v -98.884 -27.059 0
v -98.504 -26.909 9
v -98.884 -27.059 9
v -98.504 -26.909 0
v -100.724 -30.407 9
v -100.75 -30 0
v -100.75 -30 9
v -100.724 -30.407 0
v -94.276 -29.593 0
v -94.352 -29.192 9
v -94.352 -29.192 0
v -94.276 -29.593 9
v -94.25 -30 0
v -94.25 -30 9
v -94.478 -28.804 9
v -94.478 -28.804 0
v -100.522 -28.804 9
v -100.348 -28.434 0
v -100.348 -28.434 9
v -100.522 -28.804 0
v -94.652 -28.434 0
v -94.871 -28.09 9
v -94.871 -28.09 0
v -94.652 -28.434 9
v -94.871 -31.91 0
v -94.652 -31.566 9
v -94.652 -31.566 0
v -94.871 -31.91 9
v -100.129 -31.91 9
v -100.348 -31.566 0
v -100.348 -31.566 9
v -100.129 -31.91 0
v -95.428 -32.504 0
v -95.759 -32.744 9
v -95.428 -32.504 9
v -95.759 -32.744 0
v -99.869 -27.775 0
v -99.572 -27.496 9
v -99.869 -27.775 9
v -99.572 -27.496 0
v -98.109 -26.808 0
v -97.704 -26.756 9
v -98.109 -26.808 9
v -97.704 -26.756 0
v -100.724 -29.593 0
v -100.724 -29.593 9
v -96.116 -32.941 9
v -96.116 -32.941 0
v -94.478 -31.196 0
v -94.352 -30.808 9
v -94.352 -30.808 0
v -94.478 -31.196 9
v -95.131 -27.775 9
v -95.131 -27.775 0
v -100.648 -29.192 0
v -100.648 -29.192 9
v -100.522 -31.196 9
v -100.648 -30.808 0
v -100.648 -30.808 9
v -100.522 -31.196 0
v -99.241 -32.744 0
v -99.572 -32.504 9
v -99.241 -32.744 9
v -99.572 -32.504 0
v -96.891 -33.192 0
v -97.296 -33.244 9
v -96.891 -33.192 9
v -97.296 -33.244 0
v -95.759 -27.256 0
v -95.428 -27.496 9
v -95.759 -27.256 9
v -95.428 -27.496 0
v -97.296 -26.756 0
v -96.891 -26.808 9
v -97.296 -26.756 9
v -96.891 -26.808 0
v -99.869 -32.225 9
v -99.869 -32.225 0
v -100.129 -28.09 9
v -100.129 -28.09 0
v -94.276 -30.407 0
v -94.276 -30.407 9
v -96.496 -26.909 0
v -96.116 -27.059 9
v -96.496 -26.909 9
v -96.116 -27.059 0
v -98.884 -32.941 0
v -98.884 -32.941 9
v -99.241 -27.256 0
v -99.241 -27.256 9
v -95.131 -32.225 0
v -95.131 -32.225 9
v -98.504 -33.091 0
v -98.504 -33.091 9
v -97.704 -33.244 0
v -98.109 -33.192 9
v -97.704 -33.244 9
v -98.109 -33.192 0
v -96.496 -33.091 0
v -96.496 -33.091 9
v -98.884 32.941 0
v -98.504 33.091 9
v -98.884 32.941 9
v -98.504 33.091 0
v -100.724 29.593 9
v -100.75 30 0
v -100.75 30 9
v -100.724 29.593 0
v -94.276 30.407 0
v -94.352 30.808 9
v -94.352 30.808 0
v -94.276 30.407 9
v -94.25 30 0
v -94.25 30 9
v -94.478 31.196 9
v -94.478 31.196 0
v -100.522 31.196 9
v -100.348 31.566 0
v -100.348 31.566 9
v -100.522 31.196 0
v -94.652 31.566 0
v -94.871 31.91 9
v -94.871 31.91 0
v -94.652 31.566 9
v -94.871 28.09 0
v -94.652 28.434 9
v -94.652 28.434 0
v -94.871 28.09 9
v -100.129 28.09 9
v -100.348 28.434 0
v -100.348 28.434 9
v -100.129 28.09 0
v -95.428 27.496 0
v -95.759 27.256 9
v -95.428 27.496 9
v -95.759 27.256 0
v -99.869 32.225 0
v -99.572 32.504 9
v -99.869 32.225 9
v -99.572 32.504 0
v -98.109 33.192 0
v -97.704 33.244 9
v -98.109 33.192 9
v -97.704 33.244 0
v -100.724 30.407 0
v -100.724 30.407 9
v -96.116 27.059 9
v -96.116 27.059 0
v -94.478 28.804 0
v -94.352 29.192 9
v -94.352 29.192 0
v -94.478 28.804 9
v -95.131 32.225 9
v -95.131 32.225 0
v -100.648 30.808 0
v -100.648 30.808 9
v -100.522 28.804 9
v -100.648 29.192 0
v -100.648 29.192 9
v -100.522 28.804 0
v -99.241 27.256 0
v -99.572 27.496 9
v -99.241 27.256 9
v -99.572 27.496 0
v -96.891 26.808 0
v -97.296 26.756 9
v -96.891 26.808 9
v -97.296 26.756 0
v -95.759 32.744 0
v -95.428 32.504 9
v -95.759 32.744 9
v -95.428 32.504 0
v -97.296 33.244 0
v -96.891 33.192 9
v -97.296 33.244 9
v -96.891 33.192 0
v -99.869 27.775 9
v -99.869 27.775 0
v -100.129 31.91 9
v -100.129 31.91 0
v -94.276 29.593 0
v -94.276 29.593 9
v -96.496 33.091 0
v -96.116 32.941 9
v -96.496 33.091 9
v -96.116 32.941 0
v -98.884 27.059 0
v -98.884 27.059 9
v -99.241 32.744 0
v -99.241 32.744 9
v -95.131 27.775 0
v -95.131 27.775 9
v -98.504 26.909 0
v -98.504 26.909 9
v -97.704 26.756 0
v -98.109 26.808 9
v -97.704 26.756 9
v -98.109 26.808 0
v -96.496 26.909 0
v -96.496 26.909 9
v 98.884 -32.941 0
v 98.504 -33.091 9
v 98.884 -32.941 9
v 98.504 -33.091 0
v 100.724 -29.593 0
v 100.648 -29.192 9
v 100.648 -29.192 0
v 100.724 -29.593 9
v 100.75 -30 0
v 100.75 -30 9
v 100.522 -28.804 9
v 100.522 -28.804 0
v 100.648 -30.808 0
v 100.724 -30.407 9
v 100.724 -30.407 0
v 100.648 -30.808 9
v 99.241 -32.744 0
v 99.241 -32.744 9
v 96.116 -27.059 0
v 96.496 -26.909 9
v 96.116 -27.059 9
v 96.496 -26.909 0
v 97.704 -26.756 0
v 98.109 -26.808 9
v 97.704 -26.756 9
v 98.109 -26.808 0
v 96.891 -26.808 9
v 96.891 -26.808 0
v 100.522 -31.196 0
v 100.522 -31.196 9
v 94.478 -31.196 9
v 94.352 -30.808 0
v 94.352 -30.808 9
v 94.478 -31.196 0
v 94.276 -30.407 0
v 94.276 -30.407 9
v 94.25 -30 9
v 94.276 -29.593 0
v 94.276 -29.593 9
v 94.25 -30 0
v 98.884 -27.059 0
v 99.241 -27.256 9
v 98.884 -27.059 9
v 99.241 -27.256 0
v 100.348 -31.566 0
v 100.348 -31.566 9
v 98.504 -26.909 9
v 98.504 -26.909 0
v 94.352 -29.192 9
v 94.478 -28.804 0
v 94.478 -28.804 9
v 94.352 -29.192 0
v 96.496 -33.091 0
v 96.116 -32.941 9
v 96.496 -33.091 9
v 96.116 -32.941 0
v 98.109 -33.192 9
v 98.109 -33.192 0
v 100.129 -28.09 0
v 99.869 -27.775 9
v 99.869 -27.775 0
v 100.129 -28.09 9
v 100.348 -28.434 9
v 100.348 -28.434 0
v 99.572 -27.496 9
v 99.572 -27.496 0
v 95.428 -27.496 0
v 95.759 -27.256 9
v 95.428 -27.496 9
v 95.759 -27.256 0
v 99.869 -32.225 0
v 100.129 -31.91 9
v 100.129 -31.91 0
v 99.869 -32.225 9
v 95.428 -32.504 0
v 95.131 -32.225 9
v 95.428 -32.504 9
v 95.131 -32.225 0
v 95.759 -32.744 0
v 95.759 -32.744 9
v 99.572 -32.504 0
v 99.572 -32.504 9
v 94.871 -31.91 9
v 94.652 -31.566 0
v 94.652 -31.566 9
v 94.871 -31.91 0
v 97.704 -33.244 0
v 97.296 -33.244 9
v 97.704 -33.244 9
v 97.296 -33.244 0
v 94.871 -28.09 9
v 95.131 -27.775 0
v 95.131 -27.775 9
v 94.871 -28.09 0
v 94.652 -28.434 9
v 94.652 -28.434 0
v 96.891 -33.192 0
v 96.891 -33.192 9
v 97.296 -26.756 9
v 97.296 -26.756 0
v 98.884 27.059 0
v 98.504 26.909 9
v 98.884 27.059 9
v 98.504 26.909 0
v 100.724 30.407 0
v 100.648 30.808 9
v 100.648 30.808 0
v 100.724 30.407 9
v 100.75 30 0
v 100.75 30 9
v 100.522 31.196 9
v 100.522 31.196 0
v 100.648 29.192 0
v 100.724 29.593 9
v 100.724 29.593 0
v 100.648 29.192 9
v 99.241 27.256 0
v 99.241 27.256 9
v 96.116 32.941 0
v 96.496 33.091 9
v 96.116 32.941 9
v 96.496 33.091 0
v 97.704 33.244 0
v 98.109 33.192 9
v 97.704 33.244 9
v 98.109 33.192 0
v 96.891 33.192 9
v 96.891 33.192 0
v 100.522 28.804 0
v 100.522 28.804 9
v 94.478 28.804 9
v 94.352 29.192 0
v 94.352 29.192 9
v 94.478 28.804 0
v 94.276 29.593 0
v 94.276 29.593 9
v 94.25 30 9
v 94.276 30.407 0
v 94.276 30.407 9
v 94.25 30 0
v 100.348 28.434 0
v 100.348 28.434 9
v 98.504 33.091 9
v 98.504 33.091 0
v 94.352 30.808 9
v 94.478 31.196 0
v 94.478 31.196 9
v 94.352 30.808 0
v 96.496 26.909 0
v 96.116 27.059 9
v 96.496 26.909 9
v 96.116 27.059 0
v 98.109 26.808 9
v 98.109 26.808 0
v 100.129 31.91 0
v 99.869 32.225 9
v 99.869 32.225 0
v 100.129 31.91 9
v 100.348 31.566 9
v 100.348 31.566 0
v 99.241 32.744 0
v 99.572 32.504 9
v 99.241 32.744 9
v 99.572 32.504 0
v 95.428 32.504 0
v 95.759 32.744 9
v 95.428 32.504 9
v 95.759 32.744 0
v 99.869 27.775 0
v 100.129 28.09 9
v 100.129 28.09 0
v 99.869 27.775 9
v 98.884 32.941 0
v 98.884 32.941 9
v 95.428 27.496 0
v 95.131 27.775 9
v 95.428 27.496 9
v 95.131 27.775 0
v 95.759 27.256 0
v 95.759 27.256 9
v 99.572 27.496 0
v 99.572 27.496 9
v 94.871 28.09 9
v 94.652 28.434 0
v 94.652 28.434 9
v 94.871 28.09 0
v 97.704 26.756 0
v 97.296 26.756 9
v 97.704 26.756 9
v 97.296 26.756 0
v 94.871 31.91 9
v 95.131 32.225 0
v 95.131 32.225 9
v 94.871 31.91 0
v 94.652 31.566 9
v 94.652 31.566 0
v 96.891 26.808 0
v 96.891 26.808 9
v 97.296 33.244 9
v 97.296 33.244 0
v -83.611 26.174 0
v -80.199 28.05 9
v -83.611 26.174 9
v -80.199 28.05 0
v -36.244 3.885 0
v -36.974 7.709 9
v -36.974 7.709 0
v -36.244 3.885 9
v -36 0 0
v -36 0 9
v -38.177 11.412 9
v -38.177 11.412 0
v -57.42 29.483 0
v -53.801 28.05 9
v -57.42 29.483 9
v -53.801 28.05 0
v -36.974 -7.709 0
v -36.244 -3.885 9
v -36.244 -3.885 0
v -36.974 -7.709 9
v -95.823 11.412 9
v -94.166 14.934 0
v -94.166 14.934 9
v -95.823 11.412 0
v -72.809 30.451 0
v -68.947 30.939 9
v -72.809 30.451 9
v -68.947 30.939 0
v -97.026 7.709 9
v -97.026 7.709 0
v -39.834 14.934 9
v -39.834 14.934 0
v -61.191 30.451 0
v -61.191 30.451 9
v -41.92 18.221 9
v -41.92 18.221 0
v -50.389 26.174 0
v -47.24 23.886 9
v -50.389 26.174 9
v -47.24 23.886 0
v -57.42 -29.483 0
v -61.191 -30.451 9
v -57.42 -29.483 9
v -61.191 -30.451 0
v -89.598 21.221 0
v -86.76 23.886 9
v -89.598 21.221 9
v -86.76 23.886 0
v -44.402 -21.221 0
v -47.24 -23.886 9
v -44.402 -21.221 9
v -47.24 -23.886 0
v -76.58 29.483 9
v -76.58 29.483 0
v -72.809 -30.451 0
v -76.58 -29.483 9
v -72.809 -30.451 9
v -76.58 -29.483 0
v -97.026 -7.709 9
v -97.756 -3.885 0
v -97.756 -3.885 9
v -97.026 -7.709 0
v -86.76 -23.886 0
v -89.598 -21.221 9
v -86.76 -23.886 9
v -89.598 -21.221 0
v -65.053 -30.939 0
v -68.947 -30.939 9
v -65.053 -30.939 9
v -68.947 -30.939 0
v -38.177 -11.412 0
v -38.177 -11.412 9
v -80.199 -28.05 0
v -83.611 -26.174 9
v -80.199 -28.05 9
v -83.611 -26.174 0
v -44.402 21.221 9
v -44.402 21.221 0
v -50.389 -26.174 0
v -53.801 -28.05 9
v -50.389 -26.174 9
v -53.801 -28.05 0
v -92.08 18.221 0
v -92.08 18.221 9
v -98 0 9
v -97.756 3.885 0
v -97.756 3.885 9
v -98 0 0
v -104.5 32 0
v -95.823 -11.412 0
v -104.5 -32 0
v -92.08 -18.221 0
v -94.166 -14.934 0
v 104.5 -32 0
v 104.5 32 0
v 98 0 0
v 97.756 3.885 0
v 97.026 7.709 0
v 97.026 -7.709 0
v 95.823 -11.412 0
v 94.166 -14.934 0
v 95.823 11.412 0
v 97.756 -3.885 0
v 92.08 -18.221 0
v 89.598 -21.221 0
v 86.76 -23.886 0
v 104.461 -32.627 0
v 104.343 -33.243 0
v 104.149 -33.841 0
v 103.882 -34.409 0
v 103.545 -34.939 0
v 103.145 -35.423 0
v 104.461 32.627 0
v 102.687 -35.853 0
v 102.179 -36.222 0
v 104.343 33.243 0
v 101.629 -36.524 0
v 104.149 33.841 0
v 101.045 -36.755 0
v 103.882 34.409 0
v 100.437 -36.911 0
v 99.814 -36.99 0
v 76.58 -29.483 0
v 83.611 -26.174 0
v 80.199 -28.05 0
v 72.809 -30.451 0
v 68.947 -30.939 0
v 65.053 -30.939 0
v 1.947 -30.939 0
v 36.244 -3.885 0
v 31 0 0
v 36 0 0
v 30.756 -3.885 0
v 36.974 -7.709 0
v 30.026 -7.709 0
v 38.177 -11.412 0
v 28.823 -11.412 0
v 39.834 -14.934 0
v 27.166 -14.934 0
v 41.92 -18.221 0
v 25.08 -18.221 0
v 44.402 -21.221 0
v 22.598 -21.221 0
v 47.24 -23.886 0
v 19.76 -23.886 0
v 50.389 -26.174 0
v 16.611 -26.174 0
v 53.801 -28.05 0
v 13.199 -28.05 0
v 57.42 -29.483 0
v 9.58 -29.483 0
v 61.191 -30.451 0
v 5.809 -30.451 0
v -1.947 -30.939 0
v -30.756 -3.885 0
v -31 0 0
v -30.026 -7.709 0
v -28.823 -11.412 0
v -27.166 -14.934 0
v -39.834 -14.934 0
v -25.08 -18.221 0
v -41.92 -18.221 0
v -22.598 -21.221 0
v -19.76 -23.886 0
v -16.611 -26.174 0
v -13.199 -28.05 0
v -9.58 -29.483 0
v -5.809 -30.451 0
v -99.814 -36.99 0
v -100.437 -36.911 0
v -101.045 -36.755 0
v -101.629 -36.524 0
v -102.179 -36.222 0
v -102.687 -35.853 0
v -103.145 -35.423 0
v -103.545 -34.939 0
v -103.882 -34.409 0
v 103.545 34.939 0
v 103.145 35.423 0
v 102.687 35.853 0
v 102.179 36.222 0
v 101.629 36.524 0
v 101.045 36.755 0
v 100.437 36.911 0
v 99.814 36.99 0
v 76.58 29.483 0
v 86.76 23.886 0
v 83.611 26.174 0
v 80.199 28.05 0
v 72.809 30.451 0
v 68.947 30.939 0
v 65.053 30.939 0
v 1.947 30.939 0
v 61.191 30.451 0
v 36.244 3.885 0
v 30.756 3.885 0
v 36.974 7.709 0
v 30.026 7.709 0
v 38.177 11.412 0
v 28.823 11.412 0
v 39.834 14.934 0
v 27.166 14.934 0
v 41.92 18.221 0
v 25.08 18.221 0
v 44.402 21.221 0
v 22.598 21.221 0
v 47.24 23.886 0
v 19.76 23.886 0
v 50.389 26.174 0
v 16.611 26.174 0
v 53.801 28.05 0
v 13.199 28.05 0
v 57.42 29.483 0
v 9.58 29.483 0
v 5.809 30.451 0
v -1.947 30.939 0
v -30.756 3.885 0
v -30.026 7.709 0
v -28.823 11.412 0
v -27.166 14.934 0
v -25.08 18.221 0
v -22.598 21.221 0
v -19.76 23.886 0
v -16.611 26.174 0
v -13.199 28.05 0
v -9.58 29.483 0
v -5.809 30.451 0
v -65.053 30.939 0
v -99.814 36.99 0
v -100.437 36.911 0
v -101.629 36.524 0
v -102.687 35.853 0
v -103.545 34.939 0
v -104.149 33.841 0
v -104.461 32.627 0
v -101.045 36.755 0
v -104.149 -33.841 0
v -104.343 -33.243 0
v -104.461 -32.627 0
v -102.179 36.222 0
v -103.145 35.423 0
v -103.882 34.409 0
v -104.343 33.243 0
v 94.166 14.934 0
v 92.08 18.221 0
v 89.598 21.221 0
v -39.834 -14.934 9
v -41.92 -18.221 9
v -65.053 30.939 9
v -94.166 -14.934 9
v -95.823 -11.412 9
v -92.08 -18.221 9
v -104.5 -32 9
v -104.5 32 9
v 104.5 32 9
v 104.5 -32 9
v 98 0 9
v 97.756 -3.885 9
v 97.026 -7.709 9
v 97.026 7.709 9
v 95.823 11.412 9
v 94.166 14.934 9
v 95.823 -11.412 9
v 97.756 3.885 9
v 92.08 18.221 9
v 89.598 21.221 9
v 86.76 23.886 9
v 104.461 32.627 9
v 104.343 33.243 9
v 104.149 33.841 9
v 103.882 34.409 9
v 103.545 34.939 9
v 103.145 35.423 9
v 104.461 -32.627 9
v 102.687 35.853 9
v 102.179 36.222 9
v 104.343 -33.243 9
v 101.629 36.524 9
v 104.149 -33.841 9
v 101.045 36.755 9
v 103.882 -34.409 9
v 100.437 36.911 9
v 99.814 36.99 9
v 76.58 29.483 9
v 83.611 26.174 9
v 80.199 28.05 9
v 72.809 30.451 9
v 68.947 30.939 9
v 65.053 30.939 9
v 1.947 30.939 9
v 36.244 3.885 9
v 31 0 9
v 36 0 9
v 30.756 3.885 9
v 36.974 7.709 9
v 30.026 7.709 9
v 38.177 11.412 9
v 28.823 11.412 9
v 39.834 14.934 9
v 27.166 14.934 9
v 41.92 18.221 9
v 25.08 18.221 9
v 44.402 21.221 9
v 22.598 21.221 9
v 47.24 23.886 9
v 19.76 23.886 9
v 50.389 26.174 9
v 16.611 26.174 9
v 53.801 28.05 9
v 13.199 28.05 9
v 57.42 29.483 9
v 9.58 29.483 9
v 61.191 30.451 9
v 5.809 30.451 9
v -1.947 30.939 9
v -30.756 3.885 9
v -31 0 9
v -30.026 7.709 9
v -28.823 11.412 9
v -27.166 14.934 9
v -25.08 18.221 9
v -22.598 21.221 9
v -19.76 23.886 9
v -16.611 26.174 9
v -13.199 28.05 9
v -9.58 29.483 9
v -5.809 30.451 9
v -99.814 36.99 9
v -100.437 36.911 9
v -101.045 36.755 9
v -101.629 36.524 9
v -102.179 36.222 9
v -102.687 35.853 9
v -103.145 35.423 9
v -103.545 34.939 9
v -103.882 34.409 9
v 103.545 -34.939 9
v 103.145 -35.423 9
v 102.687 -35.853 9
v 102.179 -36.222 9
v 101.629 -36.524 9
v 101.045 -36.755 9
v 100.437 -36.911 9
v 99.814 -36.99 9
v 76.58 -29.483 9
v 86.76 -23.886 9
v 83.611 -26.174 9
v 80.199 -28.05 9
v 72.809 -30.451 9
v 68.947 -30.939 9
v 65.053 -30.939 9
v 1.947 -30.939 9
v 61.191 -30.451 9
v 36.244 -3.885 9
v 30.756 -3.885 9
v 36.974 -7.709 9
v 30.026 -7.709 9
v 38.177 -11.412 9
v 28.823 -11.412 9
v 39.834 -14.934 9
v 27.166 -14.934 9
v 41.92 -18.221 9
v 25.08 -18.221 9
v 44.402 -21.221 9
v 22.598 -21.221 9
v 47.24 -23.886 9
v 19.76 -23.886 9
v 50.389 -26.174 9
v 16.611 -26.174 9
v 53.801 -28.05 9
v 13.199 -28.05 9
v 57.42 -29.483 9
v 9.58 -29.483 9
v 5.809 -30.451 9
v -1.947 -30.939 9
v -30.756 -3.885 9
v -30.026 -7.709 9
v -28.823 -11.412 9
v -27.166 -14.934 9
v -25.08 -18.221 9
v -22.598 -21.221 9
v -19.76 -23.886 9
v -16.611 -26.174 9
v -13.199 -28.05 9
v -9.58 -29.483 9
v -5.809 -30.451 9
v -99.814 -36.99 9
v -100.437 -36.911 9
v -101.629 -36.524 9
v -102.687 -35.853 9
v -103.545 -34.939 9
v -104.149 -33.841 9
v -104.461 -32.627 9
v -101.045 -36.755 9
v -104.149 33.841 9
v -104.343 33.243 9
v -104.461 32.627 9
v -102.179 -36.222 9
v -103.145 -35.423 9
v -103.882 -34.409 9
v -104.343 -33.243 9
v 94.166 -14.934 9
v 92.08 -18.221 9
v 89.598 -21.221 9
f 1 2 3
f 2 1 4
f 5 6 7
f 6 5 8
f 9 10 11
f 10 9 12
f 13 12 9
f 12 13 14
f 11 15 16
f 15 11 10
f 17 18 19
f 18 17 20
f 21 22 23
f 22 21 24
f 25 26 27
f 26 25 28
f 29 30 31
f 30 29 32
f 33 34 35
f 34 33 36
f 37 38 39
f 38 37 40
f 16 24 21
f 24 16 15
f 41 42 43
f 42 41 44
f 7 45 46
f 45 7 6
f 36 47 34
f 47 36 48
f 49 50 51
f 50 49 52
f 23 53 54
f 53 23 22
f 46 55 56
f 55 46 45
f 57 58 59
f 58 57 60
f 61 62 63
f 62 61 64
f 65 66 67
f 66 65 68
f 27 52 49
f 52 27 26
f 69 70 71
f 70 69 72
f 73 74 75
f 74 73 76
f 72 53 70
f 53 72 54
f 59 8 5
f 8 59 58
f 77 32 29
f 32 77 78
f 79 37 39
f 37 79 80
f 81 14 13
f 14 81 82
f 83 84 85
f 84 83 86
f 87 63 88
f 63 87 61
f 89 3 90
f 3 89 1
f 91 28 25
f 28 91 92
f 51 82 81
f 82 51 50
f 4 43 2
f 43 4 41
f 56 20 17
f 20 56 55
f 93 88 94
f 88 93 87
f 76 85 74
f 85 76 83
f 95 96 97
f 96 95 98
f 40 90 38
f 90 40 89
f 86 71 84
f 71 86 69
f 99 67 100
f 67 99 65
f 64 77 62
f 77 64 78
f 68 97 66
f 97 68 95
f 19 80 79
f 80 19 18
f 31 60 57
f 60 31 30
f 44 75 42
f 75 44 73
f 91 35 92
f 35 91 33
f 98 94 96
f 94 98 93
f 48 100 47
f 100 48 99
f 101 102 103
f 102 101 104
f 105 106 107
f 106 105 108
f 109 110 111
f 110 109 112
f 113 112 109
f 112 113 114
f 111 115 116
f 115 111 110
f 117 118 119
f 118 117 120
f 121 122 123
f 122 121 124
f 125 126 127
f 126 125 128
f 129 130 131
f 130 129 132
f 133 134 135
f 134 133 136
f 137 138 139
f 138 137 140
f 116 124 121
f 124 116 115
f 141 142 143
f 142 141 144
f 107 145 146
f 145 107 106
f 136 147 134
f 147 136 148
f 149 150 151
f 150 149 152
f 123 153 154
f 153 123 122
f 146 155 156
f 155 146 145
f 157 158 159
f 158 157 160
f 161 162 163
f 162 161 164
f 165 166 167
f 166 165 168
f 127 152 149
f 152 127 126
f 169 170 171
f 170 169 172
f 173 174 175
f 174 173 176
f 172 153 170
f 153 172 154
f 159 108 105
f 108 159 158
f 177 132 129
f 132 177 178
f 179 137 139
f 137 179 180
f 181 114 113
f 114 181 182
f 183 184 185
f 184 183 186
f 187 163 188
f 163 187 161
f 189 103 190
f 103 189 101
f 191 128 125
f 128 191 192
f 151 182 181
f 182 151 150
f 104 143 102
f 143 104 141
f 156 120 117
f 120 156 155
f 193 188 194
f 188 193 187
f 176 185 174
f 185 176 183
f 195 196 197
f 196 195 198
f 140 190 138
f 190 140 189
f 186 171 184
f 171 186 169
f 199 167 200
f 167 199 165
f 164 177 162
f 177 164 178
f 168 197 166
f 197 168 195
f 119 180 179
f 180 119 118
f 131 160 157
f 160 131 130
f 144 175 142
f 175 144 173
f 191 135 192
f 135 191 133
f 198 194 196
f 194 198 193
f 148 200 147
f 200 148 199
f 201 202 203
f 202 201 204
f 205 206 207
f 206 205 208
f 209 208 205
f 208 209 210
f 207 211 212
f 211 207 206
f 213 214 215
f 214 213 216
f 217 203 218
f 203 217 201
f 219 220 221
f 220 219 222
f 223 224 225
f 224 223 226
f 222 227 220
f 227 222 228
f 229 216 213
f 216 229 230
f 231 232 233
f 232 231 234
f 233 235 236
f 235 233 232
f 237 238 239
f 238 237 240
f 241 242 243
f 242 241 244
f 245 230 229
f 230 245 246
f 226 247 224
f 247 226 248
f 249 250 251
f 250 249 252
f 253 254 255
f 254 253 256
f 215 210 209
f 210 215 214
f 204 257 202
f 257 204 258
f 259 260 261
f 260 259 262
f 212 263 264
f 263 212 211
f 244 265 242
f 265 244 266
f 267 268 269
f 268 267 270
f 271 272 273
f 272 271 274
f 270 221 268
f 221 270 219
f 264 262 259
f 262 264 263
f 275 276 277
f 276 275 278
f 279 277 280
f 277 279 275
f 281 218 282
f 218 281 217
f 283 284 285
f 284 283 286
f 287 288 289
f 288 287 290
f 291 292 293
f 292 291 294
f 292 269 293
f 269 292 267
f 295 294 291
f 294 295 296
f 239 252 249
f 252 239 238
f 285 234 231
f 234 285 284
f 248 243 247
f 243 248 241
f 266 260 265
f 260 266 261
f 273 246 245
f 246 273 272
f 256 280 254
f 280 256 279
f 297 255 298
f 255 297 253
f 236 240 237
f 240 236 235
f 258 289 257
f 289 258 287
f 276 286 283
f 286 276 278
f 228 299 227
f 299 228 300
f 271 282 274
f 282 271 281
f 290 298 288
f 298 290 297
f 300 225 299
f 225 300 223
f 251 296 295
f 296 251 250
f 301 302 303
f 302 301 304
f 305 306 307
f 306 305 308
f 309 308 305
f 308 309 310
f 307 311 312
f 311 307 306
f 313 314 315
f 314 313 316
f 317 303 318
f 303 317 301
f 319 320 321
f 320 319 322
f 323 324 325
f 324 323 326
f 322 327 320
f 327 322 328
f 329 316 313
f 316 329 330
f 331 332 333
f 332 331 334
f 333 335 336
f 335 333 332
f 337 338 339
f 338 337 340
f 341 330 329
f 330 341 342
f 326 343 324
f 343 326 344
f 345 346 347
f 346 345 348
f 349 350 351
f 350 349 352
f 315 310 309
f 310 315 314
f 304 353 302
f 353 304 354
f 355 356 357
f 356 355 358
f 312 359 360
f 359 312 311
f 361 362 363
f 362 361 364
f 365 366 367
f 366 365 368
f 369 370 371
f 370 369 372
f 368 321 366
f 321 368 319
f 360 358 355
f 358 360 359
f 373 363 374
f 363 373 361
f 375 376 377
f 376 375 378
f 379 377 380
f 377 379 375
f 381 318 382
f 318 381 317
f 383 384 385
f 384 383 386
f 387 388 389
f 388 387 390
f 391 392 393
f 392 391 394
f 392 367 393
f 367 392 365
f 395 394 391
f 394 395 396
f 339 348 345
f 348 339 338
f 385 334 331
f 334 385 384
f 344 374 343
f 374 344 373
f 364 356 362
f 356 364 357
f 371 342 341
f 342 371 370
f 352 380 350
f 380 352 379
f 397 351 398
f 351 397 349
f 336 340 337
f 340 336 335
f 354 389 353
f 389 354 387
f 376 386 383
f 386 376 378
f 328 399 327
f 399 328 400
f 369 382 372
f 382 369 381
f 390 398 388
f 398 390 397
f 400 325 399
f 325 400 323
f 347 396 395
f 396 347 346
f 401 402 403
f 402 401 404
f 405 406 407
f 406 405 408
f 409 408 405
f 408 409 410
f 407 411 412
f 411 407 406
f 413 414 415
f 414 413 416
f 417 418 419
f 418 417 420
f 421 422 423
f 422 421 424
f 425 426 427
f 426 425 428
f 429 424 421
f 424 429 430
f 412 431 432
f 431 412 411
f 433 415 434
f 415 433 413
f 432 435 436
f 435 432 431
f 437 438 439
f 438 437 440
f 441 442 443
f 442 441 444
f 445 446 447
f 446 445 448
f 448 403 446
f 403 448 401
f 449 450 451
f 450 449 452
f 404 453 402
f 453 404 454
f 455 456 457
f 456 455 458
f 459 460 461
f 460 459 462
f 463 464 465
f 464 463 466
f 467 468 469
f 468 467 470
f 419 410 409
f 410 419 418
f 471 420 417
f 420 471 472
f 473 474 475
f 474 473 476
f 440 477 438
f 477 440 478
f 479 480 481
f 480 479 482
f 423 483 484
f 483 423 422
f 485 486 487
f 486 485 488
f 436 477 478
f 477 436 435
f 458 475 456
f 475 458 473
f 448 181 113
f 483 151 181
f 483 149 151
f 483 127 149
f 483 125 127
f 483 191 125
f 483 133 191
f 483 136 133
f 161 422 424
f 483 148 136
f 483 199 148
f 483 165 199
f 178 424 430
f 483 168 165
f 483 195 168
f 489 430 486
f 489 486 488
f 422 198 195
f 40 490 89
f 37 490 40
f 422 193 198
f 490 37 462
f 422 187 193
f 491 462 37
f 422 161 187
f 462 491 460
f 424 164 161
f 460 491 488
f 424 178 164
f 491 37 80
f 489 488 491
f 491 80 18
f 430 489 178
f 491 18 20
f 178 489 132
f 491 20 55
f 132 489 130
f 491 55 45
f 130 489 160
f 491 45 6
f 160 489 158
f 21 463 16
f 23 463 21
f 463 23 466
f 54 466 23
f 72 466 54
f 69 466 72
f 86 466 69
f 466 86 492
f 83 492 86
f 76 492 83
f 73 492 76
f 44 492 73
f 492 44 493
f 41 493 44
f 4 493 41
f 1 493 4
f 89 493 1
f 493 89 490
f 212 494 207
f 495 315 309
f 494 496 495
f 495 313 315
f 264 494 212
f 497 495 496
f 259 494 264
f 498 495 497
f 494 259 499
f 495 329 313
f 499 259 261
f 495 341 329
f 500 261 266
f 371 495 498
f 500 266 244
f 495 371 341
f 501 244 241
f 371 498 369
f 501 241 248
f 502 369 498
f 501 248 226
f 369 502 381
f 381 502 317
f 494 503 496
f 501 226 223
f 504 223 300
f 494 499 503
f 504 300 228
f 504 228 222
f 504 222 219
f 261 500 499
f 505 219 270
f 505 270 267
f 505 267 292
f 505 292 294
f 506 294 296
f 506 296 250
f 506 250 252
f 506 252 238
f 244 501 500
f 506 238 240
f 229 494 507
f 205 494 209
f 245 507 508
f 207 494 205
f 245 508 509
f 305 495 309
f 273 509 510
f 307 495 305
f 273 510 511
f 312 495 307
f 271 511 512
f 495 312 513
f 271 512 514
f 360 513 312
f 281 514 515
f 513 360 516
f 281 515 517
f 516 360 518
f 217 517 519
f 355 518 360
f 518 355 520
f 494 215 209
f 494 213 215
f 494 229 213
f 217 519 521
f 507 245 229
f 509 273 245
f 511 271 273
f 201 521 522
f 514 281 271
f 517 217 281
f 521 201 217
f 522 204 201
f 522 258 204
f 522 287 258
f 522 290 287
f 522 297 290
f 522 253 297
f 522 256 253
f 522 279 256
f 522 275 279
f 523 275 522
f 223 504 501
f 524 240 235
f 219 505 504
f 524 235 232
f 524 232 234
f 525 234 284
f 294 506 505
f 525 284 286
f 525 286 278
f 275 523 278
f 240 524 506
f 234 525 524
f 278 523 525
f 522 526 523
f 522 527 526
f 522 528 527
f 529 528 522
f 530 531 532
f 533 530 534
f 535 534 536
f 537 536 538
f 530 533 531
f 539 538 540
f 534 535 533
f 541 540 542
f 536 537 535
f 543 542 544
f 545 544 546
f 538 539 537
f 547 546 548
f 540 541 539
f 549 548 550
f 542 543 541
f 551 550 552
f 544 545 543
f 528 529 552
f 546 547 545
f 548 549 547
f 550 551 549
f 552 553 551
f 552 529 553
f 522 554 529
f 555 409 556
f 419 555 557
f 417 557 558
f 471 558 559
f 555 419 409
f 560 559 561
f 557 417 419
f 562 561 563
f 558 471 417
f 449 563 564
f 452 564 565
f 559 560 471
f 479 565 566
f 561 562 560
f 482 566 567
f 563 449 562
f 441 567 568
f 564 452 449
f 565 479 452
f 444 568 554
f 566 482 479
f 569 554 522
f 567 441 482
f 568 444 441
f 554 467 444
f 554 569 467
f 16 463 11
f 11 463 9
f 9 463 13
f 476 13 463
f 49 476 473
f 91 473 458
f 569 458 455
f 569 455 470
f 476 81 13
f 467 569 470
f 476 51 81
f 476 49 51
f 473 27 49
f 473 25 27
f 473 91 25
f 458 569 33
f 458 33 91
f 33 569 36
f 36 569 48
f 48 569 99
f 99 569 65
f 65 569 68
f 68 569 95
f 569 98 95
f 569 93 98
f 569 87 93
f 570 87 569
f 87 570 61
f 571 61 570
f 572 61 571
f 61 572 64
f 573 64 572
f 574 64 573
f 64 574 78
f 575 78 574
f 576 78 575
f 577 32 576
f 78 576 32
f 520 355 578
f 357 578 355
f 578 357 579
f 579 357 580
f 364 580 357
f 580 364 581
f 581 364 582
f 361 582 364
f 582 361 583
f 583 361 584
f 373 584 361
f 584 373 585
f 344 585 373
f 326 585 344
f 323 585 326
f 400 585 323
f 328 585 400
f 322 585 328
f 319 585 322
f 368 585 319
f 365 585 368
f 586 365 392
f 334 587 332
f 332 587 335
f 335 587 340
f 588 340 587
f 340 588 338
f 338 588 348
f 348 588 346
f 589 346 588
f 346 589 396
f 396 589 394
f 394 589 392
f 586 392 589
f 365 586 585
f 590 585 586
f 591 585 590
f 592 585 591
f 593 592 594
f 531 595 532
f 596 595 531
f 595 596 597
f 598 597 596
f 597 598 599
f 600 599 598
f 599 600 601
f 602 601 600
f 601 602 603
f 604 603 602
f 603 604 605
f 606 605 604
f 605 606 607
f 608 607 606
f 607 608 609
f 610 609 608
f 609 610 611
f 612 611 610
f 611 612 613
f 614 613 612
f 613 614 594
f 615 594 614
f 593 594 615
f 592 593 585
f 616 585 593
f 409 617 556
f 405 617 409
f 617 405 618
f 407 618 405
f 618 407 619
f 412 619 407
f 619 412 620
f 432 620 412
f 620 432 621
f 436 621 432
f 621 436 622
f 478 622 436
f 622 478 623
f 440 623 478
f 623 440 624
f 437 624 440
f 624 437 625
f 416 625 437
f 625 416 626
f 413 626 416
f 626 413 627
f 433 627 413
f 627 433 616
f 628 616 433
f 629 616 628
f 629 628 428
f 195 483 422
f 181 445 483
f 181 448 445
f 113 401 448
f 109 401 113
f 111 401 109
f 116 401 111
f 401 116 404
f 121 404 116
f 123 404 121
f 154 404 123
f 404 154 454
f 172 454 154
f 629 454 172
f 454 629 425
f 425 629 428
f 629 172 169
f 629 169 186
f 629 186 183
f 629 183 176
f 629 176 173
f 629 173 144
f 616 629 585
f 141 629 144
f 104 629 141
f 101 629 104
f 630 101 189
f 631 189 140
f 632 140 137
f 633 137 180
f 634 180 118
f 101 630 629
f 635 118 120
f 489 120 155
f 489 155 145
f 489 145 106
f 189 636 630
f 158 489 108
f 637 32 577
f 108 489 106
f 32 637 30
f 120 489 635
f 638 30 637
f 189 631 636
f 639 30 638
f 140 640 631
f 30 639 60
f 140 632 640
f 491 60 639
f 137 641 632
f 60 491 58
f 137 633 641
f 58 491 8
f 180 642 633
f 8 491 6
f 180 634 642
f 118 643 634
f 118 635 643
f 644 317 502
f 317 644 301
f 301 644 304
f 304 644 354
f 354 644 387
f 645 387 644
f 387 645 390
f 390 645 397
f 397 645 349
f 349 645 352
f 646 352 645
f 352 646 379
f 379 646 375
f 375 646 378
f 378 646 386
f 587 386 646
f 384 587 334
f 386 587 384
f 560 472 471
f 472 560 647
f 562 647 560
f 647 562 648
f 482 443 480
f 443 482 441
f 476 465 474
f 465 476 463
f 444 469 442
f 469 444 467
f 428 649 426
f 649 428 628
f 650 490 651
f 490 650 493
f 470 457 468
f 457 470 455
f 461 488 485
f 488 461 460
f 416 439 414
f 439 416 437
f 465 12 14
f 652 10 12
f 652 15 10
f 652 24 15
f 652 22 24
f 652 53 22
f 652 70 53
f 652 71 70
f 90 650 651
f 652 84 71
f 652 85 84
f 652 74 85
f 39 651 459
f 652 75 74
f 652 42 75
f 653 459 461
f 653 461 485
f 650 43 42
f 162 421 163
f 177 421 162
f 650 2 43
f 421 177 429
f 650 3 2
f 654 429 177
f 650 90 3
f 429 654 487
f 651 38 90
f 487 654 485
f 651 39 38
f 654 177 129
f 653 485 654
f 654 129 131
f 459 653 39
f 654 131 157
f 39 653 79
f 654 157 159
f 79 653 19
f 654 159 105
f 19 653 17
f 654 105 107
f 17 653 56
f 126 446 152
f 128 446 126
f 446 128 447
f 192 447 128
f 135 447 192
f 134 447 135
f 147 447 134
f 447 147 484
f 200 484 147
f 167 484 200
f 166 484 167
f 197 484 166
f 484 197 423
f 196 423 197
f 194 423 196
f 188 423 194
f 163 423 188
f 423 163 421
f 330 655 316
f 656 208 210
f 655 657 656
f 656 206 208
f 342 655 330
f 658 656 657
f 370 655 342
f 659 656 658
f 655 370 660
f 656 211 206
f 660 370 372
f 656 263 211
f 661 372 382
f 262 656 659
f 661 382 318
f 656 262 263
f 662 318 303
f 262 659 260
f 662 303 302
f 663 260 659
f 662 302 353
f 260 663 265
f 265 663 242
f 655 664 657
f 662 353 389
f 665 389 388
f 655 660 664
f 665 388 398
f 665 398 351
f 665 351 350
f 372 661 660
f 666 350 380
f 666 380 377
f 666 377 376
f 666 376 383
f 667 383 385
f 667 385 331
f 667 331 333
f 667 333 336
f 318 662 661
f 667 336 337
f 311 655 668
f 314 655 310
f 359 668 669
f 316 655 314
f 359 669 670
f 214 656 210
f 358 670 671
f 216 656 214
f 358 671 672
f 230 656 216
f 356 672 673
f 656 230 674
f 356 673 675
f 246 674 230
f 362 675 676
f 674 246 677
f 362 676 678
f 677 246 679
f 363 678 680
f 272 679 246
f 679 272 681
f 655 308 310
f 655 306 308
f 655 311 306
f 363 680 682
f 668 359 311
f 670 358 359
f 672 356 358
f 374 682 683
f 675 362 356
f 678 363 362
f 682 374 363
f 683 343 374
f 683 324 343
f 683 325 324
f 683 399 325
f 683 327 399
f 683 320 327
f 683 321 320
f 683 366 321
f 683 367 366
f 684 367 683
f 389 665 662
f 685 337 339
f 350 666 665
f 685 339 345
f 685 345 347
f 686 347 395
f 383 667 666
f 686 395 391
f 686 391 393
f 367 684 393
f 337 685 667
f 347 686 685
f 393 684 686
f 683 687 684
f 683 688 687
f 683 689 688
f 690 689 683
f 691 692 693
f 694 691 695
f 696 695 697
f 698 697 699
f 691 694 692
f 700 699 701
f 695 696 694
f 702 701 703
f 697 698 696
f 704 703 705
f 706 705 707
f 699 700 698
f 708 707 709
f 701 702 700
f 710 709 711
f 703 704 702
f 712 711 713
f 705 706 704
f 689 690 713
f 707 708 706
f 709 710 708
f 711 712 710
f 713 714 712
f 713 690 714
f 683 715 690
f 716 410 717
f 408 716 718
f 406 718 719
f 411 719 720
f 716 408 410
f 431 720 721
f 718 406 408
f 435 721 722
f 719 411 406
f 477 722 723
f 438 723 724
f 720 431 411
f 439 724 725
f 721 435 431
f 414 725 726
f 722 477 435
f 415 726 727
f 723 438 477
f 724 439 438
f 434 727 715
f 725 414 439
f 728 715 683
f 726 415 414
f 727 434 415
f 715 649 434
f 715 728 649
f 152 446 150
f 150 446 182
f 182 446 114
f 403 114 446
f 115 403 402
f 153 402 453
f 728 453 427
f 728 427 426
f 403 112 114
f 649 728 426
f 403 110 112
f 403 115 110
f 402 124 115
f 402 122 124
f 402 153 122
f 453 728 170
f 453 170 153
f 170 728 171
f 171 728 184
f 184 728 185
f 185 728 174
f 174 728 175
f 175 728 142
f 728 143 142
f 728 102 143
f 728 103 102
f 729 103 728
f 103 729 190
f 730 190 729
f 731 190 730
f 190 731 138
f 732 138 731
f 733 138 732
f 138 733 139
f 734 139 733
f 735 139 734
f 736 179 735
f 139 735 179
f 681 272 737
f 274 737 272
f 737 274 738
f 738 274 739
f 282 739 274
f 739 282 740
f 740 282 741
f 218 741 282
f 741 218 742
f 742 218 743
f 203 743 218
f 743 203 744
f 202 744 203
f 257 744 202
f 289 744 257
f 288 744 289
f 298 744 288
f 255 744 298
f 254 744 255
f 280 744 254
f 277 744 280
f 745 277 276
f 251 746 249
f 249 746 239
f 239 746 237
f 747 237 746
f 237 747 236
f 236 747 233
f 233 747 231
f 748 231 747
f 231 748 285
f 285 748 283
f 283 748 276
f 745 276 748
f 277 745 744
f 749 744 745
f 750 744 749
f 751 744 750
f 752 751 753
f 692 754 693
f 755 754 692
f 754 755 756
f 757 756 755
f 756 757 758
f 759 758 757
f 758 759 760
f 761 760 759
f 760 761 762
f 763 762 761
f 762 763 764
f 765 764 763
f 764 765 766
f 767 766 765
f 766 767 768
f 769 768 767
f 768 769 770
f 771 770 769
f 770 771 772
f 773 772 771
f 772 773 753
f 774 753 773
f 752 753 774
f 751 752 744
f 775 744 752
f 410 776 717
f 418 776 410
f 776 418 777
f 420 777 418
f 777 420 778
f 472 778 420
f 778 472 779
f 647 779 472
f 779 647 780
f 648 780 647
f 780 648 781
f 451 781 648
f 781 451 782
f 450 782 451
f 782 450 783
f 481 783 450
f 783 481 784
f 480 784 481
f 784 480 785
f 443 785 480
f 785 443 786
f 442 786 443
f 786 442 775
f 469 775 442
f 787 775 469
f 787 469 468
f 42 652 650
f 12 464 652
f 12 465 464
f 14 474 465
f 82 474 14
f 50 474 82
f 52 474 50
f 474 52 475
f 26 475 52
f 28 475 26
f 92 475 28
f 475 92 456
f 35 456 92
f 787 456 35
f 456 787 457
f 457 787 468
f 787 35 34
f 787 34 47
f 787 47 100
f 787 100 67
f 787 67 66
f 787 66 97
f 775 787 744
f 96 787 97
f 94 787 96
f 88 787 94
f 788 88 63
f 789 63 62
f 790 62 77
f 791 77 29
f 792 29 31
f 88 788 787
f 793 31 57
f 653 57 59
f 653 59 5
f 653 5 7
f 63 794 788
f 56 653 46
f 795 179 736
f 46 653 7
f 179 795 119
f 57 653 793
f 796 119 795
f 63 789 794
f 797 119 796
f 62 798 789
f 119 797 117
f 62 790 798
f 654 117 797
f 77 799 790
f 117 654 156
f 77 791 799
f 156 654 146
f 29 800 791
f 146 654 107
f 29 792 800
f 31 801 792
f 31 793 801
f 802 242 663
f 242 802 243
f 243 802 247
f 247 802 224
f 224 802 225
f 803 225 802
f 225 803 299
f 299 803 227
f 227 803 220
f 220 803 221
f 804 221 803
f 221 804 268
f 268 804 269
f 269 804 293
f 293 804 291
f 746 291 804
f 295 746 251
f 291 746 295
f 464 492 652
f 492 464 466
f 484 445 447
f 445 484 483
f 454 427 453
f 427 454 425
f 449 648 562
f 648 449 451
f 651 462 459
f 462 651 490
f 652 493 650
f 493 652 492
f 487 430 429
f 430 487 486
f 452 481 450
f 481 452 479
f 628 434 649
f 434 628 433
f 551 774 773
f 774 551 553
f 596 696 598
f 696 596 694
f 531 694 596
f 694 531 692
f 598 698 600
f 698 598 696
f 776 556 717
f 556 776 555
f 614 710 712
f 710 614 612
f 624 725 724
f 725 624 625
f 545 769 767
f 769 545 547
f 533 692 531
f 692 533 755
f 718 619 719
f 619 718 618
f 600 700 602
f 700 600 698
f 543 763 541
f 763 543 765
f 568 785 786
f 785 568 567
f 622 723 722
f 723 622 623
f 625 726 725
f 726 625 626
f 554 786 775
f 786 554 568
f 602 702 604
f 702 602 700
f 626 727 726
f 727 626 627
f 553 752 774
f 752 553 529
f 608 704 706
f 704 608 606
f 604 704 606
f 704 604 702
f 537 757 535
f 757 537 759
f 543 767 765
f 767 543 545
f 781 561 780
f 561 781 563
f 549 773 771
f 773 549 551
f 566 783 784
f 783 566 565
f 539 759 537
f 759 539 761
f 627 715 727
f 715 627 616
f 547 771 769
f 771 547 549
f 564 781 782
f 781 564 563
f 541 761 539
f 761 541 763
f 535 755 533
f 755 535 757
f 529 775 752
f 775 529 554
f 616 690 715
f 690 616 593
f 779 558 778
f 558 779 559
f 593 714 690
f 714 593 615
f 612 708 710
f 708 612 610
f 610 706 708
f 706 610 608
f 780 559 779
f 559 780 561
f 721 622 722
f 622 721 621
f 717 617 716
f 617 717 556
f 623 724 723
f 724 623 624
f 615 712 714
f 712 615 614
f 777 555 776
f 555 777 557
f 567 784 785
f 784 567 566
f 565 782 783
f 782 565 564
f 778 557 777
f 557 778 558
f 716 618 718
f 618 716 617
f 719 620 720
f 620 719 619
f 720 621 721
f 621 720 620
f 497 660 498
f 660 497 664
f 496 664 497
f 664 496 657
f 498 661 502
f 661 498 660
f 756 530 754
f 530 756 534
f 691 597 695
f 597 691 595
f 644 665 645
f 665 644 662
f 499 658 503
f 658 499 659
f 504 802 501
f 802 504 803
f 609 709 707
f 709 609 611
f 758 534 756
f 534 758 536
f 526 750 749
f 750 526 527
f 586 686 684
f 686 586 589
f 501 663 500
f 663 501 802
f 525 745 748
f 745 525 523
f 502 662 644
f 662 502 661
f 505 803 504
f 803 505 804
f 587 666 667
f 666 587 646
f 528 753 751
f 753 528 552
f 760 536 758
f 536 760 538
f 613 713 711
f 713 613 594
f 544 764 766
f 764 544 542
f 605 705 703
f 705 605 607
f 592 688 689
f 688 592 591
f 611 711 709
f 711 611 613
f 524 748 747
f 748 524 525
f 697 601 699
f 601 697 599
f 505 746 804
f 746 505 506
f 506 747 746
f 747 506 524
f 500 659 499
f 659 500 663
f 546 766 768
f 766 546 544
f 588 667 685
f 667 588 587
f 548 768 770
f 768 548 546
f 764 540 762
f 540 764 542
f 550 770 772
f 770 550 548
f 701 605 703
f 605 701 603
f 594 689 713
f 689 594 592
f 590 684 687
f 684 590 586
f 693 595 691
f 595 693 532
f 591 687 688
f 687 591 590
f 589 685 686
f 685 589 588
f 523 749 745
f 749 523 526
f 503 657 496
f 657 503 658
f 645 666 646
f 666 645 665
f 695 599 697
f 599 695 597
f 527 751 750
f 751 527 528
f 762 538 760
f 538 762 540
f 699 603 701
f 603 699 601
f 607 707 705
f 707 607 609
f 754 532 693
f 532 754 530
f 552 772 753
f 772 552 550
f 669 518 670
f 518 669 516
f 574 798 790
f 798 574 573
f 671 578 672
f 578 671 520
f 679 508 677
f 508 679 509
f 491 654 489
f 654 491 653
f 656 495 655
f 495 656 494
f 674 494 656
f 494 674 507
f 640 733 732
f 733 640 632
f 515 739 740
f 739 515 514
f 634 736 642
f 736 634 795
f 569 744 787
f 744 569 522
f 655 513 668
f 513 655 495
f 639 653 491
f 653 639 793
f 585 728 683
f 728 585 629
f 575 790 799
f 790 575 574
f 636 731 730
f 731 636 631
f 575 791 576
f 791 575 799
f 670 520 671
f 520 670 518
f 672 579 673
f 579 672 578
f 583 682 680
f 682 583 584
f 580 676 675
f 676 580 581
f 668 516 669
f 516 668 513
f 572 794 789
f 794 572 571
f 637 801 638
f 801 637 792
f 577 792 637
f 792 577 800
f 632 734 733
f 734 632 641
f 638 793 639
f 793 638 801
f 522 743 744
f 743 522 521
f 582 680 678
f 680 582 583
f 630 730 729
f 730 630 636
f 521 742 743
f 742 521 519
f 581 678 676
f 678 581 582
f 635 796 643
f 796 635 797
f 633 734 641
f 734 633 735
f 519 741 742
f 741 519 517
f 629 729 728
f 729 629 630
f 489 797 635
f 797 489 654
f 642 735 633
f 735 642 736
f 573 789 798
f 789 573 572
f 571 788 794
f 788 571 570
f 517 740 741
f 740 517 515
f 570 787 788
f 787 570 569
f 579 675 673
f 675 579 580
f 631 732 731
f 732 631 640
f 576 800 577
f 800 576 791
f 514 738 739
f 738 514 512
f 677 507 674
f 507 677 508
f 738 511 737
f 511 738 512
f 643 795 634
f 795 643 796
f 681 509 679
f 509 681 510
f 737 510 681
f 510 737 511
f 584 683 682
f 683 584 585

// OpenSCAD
$fn = 50;

difference() {
	union() {
		hull() {
			translate(v = [-99.5, 32.0, 0]) {
				cylinder(h = 9, r = 5);
			}
			translate(v = [99.5, 32.0, 0]) {
				cylinder(h = 9, r = 5);
			}
			translate(v = [-99.5, -32.0, 0]) {
				cylinder(h = 9, r = 5);
			}
			translate(v = [99.5, -32.0, 0]) {
				cylinder(h = 9, r = 5);
			}
		}
	}
	union() {
		translate(v = [-97.5, -30.0, -100.0]) {
			cylinder(h = 200, r = 3.25);
		}
		translate(v = [-97.5, 30.0, -100.0]) {
			cylinder(h = 200, r = 3.25);
		}
		translate(v = [97.5, -30.0, -100.0]) {
			cylinder(h = 200, r = 3.25);
		}
		translate(v = [97.5, 30.0, -100.0]) {
			cylinder(h = 200, r = 3.25);
		}
		translate(v = [-97.5, -30.0, -100.0]) {
			cylinder(h = 200, r = 1.8);
		}
		translate(v = [-97.5, 30.0, -100.0]) {
			cylinder(h = 200, r = 1.8);
		}
		translate(v = [97.5, -30.0, -100.0]) {
			cylinder(h = 200, r = 1.8);
		}
		translate(v = [97.5, 30.0, -100.0]) {
			cylinder(h = 200, r = 1.8);
		}
		translate(v = [-67.0, 0, 0.0]) {
			cylinder(h = 9, r = 31.0);
		}
		cylinder(h = 9, r = 31.0);
		translate(v = [67.0, 0, 0.0]) {
			cylinder(h = 9, r = 31.0);
		}
	}
}
